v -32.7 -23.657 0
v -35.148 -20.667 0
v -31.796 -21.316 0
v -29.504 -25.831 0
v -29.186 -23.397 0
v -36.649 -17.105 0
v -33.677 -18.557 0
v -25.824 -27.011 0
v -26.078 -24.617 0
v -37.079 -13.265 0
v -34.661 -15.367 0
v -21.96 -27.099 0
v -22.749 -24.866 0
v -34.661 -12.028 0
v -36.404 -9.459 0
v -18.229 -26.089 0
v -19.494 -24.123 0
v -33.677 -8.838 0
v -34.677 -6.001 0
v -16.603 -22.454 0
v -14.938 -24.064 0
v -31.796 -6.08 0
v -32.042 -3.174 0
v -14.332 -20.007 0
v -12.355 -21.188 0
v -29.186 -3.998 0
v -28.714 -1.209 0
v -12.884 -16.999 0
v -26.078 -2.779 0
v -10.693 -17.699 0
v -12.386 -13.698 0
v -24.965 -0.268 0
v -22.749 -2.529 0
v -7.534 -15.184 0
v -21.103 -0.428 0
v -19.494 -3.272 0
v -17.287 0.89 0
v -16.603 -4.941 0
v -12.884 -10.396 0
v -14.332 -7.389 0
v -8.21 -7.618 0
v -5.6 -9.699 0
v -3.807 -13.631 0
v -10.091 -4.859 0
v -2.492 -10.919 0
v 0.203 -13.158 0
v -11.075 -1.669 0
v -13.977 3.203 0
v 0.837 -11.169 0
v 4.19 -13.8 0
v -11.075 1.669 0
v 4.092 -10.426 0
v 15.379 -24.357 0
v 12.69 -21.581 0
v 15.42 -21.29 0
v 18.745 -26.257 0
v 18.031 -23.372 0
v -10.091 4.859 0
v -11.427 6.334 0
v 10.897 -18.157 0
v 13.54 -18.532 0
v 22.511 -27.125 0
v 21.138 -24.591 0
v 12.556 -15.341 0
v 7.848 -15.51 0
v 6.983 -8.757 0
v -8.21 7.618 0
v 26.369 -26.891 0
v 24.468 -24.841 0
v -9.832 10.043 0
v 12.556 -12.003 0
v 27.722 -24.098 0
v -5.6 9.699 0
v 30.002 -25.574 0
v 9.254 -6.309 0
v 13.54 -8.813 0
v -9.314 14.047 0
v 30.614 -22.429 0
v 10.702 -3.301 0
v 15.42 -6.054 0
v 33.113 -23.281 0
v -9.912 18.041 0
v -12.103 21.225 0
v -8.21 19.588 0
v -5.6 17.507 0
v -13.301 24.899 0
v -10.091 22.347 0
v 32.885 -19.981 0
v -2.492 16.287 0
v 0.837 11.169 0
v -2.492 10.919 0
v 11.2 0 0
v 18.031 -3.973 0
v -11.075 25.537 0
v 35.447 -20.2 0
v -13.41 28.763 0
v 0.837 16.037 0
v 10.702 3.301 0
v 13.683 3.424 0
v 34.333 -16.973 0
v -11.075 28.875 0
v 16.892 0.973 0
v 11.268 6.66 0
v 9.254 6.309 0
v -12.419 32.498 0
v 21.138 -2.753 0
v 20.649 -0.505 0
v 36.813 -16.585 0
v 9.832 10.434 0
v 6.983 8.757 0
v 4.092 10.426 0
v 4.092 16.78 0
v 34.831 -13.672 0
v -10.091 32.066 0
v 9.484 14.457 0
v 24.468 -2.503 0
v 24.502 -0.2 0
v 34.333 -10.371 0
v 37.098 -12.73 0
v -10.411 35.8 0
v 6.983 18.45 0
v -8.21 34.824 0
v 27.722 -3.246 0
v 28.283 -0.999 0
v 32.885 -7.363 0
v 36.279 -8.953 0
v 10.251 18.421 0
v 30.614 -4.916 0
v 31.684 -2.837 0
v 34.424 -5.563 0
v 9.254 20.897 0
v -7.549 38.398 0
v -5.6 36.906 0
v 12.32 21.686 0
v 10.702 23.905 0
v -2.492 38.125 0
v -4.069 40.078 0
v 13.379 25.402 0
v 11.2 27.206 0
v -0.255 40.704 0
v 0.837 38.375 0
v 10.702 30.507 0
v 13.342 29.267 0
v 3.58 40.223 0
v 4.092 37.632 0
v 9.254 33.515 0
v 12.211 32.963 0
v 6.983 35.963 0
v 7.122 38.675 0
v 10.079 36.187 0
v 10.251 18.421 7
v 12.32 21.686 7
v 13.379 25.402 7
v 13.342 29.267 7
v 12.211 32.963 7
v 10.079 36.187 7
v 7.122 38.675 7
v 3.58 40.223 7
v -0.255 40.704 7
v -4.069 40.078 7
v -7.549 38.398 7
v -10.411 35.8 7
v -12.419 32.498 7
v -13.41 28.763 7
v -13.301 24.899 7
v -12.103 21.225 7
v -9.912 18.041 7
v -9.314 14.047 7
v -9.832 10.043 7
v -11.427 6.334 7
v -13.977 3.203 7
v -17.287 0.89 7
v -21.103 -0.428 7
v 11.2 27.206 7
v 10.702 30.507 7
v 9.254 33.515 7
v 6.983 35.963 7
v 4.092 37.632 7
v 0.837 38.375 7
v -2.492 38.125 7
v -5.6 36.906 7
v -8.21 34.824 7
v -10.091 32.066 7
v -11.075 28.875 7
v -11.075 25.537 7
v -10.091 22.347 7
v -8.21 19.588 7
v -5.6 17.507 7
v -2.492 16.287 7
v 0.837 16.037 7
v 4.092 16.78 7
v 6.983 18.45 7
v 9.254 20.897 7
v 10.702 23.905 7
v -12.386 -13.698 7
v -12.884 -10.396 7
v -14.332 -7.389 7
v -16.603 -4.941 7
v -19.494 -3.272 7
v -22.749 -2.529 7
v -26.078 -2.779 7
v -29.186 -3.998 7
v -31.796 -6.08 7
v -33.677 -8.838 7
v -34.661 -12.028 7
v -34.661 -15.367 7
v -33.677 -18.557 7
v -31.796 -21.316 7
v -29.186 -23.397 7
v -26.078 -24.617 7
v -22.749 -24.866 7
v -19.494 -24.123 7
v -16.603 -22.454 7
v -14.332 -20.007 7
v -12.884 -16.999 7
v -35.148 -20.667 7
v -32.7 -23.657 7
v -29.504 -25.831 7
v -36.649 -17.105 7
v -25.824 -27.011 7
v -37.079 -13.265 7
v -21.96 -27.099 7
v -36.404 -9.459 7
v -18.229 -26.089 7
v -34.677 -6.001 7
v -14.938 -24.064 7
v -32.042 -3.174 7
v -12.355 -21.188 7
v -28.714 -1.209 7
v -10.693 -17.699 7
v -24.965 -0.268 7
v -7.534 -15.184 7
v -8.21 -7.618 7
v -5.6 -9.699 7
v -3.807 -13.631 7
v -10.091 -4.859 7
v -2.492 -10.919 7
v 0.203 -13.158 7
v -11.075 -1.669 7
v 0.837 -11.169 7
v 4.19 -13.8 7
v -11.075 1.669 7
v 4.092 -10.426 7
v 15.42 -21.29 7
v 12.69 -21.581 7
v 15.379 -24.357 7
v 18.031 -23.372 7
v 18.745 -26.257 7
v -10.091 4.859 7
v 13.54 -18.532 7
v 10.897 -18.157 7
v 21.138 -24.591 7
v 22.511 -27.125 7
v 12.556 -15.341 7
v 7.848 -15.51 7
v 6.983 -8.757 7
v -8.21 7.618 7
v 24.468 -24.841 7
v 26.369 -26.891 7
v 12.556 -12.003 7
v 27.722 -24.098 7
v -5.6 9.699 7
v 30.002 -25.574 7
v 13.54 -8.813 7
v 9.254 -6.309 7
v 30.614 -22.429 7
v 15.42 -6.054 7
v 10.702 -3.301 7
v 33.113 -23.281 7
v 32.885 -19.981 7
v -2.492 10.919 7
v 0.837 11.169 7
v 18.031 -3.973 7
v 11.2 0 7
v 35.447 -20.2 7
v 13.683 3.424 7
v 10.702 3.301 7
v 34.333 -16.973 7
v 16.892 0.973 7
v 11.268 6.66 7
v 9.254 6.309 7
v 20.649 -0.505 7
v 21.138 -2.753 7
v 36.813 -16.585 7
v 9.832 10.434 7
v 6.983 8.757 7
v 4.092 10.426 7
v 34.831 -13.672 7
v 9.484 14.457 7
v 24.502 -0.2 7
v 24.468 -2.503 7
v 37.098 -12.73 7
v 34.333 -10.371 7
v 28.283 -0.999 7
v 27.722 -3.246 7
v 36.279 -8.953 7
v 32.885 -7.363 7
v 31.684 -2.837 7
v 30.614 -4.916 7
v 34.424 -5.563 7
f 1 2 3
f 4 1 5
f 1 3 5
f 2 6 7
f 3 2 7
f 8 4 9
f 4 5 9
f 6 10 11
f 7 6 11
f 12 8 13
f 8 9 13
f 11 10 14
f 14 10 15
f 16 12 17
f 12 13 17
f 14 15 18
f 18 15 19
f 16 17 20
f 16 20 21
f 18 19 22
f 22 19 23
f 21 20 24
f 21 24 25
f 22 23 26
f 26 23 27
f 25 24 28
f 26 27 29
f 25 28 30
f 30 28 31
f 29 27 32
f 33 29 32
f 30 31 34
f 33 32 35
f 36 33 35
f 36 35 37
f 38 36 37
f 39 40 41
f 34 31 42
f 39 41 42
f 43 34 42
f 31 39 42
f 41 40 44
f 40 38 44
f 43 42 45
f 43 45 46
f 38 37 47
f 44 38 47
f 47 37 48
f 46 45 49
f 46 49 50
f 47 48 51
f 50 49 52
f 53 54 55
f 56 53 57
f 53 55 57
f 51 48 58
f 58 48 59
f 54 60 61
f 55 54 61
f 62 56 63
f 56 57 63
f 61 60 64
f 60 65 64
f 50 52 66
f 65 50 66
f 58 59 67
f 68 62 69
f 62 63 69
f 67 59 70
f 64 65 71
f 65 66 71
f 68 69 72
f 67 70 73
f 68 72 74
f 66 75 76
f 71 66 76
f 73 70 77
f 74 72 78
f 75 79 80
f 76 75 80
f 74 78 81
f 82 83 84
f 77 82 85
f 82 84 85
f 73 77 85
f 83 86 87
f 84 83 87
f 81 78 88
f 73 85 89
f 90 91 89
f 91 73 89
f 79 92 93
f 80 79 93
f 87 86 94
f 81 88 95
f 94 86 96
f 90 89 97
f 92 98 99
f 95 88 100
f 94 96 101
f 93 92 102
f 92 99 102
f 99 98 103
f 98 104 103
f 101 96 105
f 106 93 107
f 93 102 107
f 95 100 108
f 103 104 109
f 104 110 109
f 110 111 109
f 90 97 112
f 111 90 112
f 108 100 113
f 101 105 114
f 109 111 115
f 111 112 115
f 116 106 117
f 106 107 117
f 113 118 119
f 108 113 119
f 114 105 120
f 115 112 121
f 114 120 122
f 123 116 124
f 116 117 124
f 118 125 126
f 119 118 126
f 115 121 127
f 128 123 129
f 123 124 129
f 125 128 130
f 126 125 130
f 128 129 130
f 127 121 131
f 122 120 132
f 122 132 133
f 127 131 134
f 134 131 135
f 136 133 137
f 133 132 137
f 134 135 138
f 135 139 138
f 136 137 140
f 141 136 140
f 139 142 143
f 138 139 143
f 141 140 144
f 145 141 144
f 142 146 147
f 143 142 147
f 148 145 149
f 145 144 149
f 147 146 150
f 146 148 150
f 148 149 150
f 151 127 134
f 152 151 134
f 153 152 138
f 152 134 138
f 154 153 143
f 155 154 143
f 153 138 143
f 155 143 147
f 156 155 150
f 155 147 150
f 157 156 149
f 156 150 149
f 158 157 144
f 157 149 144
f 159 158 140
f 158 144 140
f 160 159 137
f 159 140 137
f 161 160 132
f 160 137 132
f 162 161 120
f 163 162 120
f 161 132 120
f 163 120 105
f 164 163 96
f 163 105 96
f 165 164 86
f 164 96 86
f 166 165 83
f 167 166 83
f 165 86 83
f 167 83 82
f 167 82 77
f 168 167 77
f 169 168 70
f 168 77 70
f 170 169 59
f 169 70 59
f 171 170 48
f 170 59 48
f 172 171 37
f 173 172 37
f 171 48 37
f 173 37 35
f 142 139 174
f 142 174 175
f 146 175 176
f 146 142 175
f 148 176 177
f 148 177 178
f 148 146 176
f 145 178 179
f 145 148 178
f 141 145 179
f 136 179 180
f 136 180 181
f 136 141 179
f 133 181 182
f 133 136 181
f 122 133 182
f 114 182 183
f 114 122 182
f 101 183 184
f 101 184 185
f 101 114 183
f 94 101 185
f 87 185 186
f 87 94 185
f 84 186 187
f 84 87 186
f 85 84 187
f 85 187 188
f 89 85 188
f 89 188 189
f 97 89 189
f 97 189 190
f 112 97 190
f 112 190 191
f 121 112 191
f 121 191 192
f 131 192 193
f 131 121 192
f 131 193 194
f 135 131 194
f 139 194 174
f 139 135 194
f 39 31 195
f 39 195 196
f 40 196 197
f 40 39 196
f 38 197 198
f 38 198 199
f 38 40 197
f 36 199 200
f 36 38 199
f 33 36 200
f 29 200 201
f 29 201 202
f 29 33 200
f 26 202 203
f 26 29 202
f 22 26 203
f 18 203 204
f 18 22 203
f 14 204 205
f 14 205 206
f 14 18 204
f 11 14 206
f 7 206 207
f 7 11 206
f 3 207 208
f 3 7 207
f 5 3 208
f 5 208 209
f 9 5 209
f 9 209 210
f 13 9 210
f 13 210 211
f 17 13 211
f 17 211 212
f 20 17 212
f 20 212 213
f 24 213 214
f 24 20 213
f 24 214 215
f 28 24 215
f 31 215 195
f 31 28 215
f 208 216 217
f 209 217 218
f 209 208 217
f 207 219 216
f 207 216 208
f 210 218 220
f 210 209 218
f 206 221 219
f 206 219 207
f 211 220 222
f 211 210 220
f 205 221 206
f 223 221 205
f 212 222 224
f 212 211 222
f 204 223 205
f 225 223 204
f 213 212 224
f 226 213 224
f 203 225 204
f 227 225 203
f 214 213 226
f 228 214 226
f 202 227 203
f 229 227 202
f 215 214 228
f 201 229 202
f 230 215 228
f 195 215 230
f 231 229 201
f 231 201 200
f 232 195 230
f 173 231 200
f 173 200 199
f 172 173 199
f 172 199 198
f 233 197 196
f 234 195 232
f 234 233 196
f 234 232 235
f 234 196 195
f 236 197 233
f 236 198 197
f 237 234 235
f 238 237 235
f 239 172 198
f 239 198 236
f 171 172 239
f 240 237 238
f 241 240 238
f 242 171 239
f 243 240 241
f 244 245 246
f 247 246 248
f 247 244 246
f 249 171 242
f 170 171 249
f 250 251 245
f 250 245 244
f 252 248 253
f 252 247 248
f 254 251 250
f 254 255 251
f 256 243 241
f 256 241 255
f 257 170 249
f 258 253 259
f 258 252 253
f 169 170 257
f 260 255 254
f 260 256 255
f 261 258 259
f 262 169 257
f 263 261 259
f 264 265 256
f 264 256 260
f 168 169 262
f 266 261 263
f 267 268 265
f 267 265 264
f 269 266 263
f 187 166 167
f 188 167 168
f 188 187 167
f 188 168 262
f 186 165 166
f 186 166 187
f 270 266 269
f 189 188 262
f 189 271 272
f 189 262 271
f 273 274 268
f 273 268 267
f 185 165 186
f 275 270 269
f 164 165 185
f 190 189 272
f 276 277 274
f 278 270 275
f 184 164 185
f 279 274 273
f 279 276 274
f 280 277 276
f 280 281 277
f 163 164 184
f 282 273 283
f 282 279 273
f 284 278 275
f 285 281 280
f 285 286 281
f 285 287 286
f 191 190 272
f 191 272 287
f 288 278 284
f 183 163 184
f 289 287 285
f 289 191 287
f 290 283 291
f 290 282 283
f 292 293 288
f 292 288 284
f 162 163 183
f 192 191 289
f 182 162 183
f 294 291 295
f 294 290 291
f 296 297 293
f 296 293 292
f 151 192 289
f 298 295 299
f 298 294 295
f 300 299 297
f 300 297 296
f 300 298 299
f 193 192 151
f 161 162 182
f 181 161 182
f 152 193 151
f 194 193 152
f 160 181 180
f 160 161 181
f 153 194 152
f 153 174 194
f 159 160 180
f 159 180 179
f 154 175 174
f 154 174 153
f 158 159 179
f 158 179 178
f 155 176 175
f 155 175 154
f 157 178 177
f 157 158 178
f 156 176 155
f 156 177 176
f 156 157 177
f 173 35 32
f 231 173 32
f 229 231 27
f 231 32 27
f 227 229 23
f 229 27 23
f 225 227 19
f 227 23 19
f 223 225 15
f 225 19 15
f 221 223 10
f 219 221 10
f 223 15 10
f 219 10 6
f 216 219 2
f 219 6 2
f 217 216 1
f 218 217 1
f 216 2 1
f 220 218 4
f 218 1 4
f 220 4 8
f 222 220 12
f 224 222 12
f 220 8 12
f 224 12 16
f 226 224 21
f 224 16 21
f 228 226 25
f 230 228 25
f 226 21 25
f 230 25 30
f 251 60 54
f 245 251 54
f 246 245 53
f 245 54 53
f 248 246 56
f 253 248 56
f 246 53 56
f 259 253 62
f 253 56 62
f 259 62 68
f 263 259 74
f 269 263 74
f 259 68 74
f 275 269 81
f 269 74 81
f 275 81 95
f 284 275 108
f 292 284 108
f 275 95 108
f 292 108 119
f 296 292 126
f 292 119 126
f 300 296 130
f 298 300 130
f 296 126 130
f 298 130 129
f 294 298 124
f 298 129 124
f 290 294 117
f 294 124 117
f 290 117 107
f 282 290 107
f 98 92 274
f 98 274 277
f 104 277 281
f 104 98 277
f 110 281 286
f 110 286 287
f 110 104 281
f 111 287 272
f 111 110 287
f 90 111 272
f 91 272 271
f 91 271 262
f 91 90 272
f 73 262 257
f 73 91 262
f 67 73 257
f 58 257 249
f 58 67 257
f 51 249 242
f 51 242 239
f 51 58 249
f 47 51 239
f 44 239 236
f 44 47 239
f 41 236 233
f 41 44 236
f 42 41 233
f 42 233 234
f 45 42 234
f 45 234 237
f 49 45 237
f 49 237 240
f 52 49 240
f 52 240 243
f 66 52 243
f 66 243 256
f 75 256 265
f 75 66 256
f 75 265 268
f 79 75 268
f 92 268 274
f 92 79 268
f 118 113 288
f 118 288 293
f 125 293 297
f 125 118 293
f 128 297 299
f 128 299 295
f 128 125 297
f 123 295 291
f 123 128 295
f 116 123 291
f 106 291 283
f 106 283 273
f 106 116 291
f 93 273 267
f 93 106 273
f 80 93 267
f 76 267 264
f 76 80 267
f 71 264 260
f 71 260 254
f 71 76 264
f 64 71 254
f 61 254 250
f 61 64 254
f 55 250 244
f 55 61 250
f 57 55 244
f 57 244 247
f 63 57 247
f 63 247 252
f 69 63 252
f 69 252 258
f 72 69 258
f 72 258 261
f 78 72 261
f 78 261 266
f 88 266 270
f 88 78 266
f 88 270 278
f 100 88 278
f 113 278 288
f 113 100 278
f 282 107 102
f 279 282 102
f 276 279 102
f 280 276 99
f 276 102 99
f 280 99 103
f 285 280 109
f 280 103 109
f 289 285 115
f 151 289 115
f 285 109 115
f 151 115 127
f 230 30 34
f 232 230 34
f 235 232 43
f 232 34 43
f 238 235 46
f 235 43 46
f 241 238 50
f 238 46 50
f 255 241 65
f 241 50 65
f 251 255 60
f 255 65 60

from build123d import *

# Parameters (mm, degrees)
F0_R     = 11.2
F1_DEPTH = 7


with BuildPart() as f1:
    # F0 (on Top) → F1 (new body)
    with BuildSketch(Plane.XY):
        with BuildLine():
            ThreePointArc((20.649142, -0.505374), (11.268043, 6.660297), (10.250514, 18.421101))
            ThreePointArc((10.250514, 18.421101), (-0.25463, 40.703741), (-9.911882, 18.040741))
            ThreePointArc((-9.911882, 18.040741), (-11.426986, 6.333635), (-21.103376, -0.427973))
            ThreePointArc((-21.103376, -0.427973), (-35.148137, -20.667014), (-10.692777, -17.69894))
            ThreePointArc((-10.692777, -17.69894), (0.203426, -13.157505), (10.897346, -18.156701))
            ThreePointArc((10.897346, -18.156701), (35.44725, -20.2003), (20.649142, -0.505374))
        make_face()
        with Locations((-23.586189, -13.697699)):
            Circle(F0_R, mode=Mode.SUBTRACT)
        Circle(F0_R, mode=Mode.SUBTRACT)
        with Locations((23.630672, -13.672017)):
            Circle(F0_R, mode=Mode.SUBTRACT)
        with Locations((0, 27.206143)):
            Circle(F0_R, mode=Mode.SUBTRACT)
    extrude(amount=F1_DEPTH)


solid = f1.part
